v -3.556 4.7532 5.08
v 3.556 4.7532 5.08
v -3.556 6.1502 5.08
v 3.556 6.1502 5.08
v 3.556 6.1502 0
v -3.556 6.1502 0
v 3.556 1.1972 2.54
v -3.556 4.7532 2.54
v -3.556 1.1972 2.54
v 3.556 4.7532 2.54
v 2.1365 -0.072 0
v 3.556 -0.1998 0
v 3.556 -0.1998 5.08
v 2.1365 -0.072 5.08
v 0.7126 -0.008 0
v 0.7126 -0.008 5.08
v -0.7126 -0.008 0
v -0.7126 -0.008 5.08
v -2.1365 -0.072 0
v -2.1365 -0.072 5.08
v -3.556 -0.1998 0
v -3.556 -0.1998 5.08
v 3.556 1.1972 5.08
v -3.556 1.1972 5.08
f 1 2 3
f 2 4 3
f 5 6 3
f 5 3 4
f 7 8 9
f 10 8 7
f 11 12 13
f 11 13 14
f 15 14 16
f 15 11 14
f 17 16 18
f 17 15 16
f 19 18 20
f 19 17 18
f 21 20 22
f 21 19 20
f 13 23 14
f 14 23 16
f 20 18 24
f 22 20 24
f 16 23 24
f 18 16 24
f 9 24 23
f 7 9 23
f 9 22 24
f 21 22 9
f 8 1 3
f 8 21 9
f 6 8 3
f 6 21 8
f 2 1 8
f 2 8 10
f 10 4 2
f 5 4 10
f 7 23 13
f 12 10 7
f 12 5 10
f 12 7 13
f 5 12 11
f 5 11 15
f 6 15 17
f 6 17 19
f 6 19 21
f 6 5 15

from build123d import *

# Parameters (mm, degrees)
BOSS_EXTRUDE1_DEPTH = 5.08
SKETCH2_W           = 7.112
SKETCH2_H           = 3.556
CUT_EXTRUDE1_DEPTH  = 2.54


with BuildPart() as part:
    # Sketch1 → Boss-Extrude1 (new body)
    with BuildSketch(Plane.XY):
        with BuildLine():
            Line((-3.556, -0.199764438), (-3.556, 6.150235562))
            Line((-3.556, 6.150235562), (3.556, 6.150235562))
            Line((3.556, 6.150235562), (3.556, -0.199764438))
            ThreePointArc((3.556, -0.199764438), (0, 0), (-3.556, -0.199764438))
        make_face()
    extrude(amount=BOSS_EXTRUDE1_DEPTH)

    # Sketch2 → Cut-Extrude1 (cut)
    with BuildSketch(Plane.XY.offset(5.08)):
        with Locations((0, 2.975235562)):
            Rectangle(SKETCH2_W, SKETCH2_H)
    extrude(amount=-CUT_EXTRUDE1_DEPTH, mode=Mode.SUBTRACT)


solid = part.part
